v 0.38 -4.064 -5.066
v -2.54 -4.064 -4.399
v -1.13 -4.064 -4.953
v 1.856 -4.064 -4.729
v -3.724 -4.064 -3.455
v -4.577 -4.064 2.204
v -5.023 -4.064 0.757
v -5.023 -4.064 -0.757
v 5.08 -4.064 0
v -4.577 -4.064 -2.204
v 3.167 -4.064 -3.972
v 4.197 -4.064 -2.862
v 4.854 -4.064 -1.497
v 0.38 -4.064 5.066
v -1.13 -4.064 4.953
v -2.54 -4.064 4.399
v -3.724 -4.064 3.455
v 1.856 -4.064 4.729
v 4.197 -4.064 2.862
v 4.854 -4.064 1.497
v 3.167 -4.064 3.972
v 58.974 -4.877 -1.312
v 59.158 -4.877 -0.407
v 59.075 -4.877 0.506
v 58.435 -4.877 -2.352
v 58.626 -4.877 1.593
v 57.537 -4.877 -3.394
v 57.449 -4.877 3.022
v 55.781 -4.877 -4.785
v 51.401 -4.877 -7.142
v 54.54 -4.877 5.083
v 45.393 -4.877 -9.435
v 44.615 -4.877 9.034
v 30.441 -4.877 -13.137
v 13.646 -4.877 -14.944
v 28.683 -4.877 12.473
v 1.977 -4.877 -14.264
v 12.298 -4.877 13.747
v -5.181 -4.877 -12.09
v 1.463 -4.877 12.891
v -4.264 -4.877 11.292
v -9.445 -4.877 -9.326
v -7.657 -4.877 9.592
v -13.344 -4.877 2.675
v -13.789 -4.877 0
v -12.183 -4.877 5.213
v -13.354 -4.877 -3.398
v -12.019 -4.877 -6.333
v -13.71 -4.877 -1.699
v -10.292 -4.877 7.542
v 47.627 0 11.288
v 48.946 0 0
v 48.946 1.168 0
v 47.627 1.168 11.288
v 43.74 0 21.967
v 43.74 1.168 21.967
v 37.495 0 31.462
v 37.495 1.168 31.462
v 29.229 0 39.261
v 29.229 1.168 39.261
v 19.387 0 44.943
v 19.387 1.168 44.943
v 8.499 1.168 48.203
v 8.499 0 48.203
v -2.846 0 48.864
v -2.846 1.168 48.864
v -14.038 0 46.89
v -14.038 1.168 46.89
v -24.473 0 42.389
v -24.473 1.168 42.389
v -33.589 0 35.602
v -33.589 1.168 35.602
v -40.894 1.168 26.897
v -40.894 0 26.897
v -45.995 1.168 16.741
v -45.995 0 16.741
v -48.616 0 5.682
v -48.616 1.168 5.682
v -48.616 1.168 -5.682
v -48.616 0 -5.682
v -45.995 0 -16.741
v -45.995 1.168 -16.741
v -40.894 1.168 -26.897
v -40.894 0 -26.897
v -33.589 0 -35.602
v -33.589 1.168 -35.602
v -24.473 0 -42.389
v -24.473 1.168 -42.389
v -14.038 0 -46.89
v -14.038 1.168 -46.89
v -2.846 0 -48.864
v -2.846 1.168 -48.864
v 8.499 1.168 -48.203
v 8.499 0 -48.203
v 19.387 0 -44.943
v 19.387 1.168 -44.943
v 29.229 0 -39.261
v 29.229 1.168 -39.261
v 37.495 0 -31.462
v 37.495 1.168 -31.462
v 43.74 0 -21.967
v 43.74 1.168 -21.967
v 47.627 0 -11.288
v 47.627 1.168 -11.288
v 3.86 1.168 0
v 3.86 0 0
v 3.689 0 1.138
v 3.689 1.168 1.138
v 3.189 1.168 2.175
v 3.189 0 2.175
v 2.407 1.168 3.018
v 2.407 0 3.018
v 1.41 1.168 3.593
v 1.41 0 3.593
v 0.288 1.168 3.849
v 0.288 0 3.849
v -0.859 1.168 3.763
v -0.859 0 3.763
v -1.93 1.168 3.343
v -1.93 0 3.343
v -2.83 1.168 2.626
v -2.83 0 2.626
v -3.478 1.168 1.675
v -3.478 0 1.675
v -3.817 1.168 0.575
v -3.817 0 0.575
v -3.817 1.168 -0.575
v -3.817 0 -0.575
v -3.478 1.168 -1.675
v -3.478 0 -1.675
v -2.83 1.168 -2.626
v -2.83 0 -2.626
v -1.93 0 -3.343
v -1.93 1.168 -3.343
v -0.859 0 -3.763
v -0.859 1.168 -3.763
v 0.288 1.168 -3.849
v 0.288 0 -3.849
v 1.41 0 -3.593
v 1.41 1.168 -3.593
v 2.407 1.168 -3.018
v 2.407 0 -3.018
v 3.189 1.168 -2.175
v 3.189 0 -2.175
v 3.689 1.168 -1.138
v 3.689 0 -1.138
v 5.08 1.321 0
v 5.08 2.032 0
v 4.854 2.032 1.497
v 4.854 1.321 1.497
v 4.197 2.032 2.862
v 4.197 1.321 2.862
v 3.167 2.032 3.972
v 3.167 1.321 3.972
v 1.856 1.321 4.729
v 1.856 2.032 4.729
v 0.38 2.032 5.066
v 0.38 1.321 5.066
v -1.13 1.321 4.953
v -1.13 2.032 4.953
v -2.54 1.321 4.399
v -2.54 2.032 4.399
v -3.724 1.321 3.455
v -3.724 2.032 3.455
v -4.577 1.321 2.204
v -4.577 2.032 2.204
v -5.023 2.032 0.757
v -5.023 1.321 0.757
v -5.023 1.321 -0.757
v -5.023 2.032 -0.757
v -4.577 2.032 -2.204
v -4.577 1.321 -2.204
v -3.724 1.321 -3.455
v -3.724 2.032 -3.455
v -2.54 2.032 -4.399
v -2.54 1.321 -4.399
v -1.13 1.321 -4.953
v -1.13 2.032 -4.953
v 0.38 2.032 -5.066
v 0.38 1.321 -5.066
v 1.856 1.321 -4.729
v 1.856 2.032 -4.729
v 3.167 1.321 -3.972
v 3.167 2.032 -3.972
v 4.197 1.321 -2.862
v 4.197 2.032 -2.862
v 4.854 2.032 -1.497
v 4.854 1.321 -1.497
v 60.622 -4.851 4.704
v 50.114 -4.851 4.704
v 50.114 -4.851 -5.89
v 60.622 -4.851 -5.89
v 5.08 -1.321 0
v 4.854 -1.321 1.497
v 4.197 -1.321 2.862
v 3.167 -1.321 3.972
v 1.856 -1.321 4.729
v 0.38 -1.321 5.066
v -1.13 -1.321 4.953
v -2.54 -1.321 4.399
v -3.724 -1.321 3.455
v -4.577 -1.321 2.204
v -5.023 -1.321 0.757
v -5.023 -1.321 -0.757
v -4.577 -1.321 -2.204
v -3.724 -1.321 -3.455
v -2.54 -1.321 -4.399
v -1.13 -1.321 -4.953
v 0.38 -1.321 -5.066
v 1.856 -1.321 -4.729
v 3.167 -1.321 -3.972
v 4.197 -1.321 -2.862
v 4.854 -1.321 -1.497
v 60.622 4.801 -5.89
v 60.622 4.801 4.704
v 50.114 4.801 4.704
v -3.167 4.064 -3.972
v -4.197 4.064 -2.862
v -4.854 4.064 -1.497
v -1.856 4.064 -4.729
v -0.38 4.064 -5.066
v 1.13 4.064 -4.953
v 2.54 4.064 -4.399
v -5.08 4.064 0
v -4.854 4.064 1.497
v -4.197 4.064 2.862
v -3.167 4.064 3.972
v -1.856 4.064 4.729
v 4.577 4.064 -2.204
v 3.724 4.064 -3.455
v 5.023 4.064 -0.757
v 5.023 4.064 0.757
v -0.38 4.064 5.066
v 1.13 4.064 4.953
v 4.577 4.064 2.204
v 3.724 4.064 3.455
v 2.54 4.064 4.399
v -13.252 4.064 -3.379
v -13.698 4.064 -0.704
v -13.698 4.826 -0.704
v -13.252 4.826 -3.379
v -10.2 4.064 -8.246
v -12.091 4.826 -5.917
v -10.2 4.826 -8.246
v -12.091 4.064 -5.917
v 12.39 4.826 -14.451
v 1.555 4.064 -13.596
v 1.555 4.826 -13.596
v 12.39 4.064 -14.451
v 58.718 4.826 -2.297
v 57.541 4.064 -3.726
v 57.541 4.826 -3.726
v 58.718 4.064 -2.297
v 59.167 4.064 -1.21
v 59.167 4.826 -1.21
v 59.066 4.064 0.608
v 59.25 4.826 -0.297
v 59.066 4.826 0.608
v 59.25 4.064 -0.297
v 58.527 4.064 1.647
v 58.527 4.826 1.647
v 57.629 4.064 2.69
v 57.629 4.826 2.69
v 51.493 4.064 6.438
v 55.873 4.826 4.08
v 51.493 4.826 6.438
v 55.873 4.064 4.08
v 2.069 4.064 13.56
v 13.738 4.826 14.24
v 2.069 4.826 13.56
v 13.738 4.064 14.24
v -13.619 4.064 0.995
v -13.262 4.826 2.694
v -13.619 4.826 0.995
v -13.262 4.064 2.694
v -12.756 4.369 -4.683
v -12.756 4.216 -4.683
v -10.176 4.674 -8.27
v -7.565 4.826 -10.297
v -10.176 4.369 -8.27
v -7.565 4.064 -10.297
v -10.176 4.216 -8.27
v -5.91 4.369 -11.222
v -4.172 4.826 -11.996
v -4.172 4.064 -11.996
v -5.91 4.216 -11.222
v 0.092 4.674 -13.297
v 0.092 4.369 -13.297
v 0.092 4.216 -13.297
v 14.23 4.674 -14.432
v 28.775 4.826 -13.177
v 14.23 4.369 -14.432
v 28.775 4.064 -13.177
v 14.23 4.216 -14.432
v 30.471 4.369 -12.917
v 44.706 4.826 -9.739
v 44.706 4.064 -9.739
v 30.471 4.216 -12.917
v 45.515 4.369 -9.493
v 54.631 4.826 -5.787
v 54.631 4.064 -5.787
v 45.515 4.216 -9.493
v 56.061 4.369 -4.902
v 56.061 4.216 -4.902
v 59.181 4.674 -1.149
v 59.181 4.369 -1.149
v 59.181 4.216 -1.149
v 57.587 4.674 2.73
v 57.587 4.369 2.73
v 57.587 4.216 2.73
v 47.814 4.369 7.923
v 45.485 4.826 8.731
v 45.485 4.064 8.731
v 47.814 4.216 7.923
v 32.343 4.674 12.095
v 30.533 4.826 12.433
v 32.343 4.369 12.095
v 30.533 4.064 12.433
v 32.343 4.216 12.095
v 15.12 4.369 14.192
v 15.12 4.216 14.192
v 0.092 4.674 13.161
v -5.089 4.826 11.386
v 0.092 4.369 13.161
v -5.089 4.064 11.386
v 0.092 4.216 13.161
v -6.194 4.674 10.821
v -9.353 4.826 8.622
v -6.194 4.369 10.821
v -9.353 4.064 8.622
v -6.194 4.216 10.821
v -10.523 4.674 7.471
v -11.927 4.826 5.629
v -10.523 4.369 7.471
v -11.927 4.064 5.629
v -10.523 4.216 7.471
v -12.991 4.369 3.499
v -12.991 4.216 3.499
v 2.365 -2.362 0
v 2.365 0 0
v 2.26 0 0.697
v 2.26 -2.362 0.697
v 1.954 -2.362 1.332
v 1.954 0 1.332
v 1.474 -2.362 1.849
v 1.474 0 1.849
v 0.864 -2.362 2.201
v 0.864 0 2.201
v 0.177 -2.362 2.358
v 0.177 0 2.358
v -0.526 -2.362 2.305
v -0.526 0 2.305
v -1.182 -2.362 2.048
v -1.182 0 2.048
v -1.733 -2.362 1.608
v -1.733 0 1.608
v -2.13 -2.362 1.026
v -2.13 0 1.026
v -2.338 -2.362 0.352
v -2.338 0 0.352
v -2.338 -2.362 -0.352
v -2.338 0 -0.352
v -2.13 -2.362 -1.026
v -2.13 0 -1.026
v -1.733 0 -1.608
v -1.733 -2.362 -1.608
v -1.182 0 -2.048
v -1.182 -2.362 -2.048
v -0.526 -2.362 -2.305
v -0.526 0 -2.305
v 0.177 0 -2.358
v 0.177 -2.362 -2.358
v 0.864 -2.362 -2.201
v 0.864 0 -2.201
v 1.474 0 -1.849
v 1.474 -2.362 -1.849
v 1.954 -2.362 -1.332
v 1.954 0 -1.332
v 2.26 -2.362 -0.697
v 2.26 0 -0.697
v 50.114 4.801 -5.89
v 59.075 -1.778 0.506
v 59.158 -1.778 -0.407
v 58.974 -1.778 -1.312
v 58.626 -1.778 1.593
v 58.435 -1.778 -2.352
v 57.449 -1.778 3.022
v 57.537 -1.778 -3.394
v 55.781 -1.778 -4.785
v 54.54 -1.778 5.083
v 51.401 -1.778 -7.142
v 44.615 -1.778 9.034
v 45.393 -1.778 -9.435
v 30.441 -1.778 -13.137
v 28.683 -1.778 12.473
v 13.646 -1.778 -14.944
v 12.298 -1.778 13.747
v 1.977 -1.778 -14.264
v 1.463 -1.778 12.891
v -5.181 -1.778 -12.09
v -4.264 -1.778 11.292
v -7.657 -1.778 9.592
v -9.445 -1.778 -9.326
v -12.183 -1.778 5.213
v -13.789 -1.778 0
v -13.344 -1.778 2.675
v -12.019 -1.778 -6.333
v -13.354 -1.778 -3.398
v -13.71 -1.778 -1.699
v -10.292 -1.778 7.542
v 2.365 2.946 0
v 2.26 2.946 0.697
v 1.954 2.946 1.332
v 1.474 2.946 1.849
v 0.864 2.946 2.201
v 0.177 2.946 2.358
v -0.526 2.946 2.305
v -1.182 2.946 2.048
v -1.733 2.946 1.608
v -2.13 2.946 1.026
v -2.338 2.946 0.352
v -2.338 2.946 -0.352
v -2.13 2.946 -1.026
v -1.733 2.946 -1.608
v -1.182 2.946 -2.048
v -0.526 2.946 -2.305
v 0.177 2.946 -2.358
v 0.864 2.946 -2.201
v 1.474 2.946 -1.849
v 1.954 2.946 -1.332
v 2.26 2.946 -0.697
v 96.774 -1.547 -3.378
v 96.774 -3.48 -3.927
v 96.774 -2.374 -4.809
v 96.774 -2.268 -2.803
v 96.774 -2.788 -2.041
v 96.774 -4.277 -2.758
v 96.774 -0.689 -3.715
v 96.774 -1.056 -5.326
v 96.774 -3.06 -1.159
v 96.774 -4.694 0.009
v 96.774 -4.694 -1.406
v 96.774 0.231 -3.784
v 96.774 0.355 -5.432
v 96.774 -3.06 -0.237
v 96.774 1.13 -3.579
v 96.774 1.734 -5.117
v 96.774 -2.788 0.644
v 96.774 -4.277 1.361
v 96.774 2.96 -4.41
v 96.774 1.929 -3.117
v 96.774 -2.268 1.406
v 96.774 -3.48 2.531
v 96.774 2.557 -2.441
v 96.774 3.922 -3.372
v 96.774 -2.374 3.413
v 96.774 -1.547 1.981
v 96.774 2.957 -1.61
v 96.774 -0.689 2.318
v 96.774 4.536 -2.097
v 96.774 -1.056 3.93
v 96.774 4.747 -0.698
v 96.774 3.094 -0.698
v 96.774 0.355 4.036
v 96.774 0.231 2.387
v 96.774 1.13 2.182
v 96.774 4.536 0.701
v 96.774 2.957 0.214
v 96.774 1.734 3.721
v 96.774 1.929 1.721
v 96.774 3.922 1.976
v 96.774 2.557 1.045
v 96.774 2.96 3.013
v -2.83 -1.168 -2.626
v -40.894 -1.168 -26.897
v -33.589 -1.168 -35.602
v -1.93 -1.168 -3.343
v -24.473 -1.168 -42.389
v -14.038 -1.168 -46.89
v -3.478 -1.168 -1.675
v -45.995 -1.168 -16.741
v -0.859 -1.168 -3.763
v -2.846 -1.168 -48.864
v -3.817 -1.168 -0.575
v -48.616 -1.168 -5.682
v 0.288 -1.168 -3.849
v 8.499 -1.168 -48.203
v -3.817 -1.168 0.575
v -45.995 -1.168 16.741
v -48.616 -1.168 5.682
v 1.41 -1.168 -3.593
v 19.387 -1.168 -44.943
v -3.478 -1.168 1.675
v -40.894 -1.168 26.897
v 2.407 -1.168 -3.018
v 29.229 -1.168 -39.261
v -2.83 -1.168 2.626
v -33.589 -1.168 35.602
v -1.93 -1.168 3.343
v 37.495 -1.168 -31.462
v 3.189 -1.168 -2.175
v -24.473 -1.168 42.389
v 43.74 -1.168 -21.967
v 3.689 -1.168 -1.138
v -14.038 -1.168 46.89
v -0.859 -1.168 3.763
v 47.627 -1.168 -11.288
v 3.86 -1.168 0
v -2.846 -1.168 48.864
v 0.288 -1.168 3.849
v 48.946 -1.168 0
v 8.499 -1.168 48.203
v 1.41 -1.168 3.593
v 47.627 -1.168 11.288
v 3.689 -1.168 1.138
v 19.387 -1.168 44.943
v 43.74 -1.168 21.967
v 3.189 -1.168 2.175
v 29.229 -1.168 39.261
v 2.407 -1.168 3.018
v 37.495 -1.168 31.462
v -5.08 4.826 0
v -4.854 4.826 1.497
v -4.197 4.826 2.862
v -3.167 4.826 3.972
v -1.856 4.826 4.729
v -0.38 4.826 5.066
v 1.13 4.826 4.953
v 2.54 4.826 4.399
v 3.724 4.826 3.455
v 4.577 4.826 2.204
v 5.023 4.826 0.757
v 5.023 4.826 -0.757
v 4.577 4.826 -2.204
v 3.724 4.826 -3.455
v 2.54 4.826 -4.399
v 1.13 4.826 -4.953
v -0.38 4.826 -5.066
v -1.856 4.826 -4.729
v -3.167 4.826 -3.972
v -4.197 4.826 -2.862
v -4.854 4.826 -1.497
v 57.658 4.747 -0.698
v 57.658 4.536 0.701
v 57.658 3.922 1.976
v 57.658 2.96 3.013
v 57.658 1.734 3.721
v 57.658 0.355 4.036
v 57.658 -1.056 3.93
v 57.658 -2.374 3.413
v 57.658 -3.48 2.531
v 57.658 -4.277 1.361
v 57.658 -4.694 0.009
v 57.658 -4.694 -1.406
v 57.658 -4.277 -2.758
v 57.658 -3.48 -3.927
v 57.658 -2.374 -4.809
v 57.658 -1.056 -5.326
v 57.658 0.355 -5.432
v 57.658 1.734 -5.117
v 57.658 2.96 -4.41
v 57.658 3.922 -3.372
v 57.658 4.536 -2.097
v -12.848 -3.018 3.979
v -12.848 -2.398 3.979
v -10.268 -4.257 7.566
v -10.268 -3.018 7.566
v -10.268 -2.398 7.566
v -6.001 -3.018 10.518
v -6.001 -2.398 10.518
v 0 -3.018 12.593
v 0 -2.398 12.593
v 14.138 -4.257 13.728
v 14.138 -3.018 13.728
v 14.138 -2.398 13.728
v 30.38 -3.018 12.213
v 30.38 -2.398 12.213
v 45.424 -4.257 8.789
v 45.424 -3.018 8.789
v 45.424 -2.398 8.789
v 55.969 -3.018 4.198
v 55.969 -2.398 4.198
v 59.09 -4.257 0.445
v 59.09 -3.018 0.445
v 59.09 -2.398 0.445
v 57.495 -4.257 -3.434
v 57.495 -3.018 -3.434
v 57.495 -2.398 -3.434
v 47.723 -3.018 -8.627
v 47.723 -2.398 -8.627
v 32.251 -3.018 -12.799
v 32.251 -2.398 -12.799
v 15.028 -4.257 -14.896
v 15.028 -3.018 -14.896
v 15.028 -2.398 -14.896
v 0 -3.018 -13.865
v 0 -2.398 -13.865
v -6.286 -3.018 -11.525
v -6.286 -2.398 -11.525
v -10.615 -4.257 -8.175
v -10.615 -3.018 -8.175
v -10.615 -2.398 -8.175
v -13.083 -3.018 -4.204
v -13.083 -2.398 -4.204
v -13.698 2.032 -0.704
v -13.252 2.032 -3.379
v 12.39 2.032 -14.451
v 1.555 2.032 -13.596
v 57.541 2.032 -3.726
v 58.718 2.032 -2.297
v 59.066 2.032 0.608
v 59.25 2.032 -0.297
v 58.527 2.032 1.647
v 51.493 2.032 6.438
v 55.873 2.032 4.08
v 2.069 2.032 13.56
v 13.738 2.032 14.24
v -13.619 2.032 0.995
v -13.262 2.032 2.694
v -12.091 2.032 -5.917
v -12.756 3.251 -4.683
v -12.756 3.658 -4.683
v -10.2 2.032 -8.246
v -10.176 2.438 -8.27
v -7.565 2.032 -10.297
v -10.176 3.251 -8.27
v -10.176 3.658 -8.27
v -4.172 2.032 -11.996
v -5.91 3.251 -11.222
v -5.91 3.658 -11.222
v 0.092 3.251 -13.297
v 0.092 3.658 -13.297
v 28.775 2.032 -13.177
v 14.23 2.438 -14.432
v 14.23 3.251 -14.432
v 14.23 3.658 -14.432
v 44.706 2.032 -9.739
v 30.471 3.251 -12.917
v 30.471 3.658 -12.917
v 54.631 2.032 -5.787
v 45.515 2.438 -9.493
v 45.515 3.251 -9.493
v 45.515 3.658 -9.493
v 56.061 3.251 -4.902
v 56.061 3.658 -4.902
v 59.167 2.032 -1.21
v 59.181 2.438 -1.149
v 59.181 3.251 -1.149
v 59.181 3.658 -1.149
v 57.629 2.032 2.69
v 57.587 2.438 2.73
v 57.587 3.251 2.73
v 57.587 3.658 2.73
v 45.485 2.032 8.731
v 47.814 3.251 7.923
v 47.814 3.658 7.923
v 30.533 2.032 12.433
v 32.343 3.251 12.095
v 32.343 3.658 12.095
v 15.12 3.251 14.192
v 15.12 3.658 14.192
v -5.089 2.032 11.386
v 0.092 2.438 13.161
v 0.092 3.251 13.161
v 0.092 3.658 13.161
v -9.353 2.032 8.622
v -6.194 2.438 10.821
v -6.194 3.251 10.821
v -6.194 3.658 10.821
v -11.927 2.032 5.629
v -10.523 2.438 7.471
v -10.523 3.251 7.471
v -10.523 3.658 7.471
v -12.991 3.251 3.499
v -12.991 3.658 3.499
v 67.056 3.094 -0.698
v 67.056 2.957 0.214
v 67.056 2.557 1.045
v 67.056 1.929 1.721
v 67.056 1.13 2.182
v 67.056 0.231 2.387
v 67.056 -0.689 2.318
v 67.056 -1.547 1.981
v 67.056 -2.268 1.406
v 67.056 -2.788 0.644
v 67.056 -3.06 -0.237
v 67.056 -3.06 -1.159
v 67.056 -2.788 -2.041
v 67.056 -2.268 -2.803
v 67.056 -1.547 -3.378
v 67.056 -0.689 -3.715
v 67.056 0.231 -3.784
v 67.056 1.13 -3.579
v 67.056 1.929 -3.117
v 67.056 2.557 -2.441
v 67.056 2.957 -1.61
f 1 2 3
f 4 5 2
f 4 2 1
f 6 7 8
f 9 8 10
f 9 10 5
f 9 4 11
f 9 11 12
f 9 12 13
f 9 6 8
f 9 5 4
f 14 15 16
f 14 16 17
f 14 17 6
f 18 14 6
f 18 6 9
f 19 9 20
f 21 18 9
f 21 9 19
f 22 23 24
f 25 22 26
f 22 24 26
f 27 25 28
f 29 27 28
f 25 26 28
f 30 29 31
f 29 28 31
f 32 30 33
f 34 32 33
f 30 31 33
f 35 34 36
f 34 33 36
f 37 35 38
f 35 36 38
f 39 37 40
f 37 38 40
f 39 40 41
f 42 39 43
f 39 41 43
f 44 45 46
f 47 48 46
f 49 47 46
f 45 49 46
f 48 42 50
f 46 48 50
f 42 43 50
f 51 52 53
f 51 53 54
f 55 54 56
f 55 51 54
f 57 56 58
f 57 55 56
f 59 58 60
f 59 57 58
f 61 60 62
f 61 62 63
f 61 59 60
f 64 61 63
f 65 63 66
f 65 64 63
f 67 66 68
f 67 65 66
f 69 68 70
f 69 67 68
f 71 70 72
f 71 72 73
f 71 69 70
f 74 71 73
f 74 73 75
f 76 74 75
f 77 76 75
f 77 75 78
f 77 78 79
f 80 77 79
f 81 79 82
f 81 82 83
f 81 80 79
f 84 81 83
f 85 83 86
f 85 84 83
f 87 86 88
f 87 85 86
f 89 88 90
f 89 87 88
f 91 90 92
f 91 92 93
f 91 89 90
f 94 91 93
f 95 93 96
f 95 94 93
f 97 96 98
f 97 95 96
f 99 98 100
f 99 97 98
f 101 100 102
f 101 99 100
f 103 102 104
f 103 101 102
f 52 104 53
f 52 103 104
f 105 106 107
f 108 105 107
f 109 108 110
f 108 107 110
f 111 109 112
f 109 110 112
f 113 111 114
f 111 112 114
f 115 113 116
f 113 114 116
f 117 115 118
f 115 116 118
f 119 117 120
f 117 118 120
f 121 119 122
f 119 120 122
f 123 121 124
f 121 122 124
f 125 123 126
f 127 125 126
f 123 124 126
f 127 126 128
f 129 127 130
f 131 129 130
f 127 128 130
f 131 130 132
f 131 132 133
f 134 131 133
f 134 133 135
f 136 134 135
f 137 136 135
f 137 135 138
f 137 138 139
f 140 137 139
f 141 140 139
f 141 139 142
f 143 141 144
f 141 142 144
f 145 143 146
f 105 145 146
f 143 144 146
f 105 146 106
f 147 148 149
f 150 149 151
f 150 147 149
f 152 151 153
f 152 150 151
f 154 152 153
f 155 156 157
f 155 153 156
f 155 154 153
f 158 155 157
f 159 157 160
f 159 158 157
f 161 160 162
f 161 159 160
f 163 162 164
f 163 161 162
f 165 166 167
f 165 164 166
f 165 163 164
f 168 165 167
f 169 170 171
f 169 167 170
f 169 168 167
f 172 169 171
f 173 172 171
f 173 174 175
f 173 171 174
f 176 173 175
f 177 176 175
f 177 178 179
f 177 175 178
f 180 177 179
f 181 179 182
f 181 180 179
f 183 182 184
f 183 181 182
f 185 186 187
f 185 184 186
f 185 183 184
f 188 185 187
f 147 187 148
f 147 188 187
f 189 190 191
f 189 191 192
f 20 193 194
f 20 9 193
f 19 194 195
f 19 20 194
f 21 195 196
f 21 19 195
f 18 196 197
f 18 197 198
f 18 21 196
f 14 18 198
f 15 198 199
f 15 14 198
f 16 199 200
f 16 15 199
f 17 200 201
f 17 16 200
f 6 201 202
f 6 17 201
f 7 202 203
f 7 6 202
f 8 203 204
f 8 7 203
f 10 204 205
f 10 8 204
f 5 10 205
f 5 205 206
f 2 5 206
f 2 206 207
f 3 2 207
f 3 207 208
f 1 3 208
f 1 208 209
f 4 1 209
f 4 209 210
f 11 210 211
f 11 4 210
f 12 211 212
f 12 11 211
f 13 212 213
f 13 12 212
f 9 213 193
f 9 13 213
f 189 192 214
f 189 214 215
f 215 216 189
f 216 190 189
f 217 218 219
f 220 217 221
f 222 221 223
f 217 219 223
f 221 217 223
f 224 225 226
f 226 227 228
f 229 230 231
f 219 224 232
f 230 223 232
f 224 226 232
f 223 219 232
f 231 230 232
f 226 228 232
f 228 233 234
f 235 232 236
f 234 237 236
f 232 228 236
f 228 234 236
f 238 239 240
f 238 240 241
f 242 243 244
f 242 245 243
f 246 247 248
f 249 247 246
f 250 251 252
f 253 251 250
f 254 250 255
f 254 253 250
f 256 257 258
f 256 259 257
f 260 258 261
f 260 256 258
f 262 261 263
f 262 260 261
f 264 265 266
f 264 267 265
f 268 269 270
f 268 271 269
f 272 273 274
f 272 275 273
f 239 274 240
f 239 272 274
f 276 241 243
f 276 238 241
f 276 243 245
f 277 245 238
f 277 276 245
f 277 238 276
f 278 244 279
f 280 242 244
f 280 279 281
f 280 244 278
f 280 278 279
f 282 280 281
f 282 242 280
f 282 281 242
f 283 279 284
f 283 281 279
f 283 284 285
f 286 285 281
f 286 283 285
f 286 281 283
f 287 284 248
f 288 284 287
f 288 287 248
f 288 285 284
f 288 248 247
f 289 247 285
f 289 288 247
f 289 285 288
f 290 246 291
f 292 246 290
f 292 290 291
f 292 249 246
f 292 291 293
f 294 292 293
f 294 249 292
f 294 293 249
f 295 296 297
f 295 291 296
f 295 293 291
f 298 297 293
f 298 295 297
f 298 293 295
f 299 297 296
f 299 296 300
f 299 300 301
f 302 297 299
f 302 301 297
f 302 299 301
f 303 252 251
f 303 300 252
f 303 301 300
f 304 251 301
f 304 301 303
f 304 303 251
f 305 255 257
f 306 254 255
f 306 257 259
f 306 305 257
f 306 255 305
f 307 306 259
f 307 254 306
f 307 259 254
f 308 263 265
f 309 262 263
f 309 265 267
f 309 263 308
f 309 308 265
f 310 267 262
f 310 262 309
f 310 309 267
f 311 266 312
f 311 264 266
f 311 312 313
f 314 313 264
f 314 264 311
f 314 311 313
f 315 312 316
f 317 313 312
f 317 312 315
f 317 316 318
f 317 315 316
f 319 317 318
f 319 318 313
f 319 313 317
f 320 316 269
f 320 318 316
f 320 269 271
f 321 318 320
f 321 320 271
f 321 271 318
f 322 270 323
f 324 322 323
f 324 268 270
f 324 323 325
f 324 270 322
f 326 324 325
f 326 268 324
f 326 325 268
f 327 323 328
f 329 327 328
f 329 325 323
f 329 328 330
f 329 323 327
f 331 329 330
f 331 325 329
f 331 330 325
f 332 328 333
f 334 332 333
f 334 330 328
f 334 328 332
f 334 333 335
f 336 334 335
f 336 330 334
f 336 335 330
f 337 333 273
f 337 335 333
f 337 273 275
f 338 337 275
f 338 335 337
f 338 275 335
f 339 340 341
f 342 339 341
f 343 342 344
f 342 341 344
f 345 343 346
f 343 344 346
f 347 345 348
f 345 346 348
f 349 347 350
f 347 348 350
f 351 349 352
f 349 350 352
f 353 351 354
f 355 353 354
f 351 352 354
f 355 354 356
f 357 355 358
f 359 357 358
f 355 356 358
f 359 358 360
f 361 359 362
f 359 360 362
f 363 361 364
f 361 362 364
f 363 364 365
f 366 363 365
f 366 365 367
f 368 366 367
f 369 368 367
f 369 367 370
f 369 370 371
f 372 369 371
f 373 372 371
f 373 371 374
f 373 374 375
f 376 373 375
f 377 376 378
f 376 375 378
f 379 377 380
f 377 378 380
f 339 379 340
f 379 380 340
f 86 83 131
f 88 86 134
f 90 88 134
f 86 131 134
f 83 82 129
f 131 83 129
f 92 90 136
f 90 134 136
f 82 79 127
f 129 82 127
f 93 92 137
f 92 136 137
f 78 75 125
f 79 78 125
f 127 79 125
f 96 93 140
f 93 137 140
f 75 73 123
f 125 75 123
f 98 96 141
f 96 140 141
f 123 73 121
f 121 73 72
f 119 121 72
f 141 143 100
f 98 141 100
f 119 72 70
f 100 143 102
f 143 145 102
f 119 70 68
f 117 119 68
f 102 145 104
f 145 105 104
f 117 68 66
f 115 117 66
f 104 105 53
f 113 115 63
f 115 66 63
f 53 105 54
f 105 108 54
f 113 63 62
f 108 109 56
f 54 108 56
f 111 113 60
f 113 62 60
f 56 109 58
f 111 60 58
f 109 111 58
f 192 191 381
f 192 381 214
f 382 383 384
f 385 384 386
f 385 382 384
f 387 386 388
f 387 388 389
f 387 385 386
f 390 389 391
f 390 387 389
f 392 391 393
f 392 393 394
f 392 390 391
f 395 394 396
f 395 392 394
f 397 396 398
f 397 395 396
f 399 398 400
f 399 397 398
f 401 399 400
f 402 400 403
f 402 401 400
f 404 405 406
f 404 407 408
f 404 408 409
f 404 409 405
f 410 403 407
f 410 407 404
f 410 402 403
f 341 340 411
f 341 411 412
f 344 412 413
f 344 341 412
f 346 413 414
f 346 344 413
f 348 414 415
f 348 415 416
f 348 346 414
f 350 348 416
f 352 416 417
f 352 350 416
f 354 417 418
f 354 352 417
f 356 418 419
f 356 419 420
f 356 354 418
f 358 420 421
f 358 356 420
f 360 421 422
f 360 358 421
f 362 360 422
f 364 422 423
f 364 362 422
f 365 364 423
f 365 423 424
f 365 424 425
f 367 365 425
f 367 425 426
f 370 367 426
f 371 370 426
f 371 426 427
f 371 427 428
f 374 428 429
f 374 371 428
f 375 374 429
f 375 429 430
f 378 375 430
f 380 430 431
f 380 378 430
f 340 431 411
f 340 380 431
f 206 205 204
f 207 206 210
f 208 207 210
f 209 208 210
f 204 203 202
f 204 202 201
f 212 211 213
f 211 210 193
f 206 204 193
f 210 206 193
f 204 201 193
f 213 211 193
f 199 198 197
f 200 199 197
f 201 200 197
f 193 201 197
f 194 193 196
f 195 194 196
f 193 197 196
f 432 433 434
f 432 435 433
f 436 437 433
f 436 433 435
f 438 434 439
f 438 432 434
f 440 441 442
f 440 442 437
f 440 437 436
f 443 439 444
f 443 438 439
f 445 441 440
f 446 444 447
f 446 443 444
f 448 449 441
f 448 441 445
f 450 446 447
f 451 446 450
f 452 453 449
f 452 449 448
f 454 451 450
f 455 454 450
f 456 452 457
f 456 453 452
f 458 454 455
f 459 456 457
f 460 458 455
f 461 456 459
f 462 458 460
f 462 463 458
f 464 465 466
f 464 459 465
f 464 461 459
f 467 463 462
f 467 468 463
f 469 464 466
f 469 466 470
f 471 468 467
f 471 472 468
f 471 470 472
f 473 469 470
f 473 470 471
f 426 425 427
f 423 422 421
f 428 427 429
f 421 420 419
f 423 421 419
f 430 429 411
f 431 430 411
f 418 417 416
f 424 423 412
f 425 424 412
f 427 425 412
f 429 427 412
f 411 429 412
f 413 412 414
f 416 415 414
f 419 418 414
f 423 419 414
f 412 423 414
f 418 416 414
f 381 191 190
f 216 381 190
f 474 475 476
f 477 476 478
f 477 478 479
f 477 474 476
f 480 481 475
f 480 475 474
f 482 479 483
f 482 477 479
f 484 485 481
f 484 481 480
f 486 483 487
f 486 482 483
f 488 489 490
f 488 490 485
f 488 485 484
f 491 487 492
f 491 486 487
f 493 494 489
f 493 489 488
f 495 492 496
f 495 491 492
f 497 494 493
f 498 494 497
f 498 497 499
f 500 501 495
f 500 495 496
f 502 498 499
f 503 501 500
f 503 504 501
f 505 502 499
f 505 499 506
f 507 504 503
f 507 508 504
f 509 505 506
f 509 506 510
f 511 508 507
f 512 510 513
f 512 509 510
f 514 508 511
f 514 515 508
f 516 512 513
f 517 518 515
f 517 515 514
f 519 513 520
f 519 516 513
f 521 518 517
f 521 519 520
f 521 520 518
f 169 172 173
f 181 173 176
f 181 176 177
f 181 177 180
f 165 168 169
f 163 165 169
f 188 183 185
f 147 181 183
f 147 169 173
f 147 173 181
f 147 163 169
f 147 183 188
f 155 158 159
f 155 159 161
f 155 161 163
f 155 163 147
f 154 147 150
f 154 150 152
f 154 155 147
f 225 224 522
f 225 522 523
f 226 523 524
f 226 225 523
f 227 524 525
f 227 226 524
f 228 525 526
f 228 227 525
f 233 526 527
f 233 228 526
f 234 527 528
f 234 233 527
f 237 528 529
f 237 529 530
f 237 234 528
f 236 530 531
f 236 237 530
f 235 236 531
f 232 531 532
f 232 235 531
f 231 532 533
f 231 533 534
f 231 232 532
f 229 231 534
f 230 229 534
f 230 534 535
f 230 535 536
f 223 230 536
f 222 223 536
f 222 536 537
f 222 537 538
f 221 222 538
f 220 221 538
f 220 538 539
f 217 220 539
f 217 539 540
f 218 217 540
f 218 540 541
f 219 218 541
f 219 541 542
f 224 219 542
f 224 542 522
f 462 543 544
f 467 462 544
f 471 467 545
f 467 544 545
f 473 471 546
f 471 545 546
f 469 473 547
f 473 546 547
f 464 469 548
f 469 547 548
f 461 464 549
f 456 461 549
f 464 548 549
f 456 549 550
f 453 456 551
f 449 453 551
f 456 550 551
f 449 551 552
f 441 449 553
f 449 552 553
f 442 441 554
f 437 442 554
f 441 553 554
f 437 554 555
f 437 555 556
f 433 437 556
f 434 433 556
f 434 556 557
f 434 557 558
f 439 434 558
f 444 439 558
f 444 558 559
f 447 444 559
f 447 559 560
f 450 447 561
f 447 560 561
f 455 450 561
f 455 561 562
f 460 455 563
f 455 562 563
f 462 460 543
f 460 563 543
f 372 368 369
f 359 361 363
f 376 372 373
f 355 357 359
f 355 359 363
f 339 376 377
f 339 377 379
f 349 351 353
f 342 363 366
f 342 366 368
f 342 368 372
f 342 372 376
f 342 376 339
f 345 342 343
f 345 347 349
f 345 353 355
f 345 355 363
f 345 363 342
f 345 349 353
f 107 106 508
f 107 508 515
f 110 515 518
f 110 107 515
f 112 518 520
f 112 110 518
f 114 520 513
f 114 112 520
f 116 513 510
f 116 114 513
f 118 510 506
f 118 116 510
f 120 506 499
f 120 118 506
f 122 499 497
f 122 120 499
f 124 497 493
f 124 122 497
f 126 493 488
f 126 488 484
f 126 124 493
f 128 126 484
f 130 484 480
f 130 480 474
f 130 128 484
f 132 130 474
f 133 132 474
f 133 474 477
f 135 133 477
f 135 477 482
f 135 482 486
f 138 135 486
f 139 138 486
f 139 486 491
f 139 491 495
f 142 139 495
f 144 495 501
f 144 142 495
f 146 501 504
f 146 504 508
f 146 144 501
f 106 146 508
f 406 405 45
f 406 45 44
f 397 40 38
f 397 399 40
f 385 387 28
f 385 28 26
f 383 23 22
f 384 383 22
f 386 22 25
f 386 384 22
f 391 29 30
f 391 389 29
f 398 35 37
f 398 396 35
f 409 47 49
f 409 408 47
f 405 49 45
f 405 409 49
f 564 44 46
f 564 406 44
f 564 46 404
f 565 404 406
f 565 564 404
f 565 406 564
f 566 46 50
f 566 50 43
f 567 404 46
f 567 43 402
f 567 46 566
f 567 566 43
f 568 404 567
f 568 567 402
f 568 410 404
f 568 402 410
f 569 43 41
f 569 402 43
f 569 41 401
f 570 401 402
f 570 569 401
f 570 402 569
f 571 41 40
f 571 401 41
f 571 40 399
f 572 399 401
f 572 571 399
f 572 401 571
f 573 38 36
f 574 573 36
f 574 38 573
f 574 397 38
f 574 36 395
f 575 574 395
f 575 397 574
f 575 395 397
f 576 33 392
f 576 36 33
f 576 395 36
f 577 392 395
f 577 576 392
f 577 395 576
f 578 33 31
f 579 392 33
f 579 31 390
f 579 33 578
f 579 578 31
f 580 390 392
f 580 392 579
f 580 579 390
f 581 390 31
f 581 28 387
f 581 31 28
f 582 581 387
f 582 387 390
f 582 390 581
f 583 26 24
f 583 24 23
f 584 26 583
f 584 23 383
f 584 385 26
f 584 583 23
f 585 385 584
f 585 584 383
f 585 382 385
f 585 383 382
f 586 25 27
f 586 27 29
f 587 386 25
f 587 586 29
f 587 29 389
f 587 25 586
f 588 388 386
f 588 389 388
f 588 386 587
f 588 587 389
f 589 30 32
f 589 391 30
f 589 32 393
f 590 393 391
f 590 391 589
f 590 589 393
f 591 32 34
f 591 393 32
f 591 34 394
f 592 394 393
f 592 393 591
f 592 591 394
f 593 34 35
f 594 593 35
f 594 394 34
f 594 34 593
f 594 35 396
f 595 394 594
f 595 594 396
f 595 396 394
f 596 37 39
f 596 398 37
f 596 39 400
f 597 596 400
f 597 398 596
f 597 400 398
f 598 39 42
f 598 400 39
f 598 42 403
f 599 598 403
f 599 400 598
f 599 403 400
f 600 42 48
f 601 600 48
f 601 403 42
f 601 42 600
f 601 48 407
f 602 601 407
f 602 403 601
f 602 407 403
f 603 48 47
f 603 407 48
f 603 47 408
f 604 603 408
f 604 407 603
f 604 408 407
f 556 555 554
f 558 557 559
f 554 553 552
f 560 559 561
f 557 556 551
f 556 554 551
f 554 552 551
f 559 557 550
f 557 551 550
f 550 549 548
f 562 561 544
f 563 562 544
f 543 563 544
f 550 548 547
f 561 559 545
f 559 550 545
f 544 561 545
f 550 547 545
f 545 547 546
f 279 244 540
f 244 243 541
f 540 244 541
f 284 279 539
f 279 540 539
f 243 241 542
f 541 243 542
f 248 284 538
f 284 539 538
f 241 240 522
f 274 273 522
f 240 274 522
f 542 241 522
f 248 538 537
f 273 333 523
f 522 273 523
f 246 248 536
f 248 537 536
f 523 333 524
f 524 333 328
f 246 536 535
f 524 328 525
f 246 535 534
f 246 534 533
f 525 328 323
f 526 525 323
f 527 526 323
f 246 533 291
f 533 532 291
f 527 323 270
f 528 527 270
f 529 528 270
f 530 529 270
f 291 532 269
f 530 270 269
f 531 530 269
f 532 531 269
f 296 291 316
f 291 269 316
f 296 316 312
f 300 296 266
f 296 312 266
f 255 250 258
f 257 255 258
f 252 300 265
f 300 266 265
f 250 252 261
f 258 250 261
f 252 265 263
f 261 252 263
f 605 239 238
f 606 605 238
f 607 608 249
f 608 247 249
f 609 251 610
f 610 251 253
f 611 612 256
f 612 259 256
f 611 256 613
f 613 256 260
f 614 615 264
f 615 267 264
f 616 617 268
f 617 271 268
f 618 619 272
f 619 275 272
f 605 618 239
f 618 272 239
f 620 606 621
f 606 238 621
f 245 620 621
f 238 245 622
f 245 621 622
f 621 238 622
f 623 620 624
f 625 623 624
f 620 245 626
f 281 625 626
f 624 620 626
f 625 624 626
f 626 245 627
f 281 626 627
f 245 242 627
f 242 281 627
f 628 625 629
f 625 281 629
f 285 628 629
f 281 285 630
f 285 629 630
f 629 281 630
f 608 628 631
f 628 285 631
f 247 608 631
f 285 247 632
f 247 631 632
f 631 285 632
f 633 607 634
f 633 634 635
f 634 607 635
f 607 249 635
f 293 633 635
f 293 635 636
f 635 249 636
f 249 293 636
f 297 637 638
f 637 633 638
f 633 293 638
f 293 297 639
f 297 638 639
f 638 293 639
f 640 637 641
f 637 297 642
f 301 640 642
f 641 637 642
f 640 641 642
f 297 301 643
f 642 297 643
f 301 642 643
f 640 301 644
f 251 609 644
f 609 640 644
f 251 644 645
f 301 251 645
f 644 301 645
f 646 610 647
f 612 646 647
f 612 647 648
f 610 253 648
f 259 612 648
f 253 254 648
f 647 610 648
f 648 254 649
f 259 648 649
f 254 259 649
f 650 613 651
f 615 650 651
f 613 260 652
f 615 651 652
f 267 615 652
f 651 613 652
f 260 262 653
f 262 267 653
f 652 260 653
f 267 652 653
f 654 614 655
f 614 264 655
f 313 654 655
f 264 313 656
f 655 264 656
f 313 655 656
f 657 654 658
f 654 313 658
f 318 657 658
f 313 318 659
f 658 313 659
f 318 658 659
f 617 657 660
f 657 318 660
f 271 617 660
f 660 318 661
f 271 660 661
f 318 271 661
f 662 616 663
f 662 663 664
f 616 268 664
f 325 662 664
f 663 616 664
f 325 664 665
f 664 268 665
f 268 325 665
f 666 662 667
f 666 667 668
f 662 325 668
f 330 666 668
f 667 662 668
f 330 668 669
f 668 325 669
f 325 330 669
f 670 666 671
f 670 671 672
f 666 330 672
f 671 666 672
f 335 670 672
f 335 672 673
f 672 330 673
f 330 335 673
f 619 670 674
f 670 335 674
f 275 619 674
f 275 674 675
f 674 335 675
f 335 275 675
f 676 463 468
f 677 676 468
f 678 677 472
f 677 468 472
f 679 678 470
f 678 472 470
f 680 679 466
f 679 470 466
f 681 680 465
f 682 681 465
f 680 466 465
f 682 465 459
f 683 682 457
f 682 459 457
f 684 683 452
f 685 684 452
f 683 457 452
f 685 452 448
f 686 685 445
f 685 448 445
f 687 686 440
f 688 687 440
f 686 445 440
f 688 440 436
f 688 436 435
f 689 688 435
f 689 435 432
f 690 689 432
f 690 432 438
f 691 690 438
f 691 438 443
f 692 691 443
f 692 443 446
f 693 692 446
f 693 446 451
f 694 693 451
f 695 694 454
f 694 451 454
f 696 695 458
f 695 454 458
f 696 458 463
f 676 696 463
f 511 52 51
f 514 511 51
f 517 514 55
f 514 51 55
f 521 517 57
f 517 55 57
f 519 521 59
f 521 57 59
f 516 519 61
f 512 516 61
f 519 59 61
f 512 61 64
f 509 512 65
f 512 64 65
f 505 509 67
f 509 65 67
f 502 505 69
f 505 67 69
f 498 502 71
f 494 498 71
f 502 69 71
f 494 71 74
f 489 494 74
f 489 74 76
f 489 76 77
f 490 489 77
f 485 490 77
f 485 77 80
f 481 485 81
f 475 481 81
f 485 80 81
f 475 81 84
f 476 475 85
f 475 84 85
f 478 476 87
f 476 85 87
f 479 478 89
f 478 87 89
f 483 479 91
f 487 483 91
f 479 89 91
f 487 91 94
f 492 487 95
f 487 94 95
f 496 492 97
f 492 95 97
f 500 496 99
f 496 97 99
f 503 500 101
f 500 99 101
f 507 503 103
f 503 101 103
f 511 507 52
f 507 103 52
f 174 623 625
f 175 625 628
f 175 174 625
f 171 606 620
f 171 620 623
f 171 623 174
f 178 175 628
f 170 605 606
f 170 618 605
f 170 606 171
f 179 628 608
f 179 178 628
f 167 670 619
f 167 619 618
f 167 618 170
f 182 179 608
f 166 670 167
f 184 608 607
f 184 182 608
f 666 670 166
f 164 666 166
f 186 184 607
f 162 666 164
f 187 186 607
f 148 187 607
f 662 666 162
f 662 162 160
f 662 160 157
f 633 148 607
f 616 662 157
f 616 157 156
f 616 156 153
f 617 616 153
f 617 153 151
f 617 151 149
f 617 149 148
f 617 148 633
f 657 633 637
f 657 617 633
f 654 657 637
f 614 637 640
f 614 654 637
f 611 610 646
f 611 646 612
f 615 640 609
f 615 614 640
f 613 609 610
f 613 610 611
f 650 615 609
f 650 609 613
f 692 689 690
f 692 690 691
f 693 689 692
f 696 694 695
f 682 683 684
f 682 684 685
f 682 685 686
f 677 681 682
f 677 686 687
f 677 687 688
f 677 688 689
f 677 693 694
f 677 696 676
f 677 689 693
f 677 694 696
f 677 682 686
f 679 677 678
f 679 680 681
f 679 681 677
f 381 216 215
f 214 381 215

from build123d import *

# Parameters (mm, degrees)
F0_R           = 5.08
F1_DEPTH       = 4.064
F1_DEPTH_BACK  = 4.064
F2_R           = 5.8752352212
F3_DEPTH       = 1.3208
F3_DEPTH_BACK  = 1.3208
F4_R           = 2.3646683211
F5_DEPTH       = 2.9464
F5_DEPTH_BACK  = 2.3622
F6_R           = 48.9464690829
F6_R_2         = 3.860163888
F7_DEPTH       = 1.1684
F7_DEPTH_BACK  = 1.1684
F9_START       = 1.778
F9_DEPTH       = 3.0988
F10_R          = 5.08
F11_DEPTH      = 0.762
F11_DEPTH_BACK = 2.032
F12_W          = 10.5080939829
F12_H          = 10.5942287482
F13_DEPTH      = 4.8514
F13_DEPTH_BACK = 4.8006
F15_START      = 57.658
F14_R          = 4.7471061373
F15_DEPTH      = 39.116
F16_R          = 3.0942155248
F17_DEPTH      = 25.4
F17_DEPTH_BACK = 29.718


with BuildPart() as f1:
    # F0 (on Front) → F1 (new body, two sides)
    with BuildSketch(Plane.XZ) as f1_sk:
        Circle(F0_R)
    extrude(amount=F1_DEPTH)
    extrude(f1_sk.sketch, amount=-F1_DEPTH_BACK)

    # F2 (on Front) → F3 (cut, two sides)
    with BuildSketch(Plane.XZ) as f3_sk:
        Circle(F2_R)
    extrude(amount=-F3_DEPTH, mode=Mode.SUBTRACT)
    extrude(f3_sk.sketch, amount=F3_DEPTH_BACK, mode=Mode.SUBTRACT)

    # F10 (on face) → F11 (join, two sides)
    with BuildSketch(Plane(origin=(0, 4.064, 0), x_dir=(-1, 0, 0), z_dir=(0, 1, 0))) as f11_sk:
        with BuildLine():
            add(Edge.make_bspline(
                [(13.697671704, -0.704160897), (13.5123292982, -6.1635970694), (1.3861584042, -20.0308785518), (-57.7381328093, -9.4549841426), (-62.2265200764, 7.2283414082), (2.29322497, 21.2692963323), (13.8873325189, 4.8824781076), (13.697671704, -0.704160897)],
                knots=[0, 0, 0, 0, 0.1618469158, 0.4436008404, 0.5480877279, 0.8343821113, 1, 1, 1, 1], degree=3))
        make_face()
        Circle(F10_R, mode=Mode.SUBTRACT)
    extrude(amount=F11_DEPTH)
    extrude(f11_sk.sketch, amount=-F11_DEPTH_BACK)


with BuildPart() as f5:
    # F4 (on Front) → F5 (new body, two sides)
    with BuildSketch(Plane.XZ) as f5_sk:
        Circle(F4_R)
    extrude(amount=-F5_DEPTH)
    extrude(f5_sk.sketch, amount=F5_DEPTH_BACK)


with BuildPart() as f7:
    # F6 (on Front) → F7 (new body, two sides)
    with BuildSketch(Plane.XZ) as f7_sk:
        Circle(F6_R)
        Circle(F6_R_2, mode=Mode.SUBTRACT)
    extrude(amount=-F7_DEPTH)
    extrude(f7_sk.sketch, amount=F7_DEPTH_BACK)


with BuildPart() as f9:
    # F8 (on Front) → F9 (new body)
    with BuildSketch(Plane.XZ.offset(F9_START)):
        with BuildLine():
            add(Edge.make_bspline(
                [(-13.7894945219, 0), (-13.6041521161, 5.4594361724), (-1.4779812221, 19.3267176548), (57.6463099913, 8.7508232457), (62.1346972584, -7.9325023052), (-2.3850477879, -21.9734572293), (-13.9791553368, -5.5866390045), (-13.7894945219, 0)],
                knots=[0, 0, 0, 0, 0.1618469158, 0.4436008404, 0.5480877279, 0.8343821113, 1, 1, 1, 1], degree=3))
        make_face()
    extrude(amount=F9_DEPTH)


with BuildPart() as f13:
    # F12 (on Front) → F13 (new body, two sides)
    with BuildSketch(Plane.XZ) as f13_sk:
        with Locations((55.3675871342, -0.5931041669)):
            Rectangle(F12_W, F12_H)
    extrude(amount=F13_DEPTH)
    extrude(f13_sk.sketch, amount=-F13_DEPTH_BACK)


with BuildPart() as f15:
    # F14 (on Right) → F15 (new body)
    with BuildSketch(Plane.YZ.offset(F15_START)):
        with Locations((0, -0.6982042105)):
            Circle(F14_R)
    extrude(amount=F15_DEPTH)

    # F16 (on face) → F17 (cut, two sides)
    with BuildSketch(Plane.YZ.offset(96.774)) as f17_sk:
        with Locations((0, -0.6982042105)):
            Circle(F16_R)
    extrude(amount=F17_DEPTH, mode=Mode.SUBTRACT)
    extrude(f17_sk.sketch, amount=-F17_DEPTH_BACK, mode=Mode.SUBTRACT)


solid = Compound([f1.part, f5.part, f7.part, f9.part, f13.part, f15.part])
